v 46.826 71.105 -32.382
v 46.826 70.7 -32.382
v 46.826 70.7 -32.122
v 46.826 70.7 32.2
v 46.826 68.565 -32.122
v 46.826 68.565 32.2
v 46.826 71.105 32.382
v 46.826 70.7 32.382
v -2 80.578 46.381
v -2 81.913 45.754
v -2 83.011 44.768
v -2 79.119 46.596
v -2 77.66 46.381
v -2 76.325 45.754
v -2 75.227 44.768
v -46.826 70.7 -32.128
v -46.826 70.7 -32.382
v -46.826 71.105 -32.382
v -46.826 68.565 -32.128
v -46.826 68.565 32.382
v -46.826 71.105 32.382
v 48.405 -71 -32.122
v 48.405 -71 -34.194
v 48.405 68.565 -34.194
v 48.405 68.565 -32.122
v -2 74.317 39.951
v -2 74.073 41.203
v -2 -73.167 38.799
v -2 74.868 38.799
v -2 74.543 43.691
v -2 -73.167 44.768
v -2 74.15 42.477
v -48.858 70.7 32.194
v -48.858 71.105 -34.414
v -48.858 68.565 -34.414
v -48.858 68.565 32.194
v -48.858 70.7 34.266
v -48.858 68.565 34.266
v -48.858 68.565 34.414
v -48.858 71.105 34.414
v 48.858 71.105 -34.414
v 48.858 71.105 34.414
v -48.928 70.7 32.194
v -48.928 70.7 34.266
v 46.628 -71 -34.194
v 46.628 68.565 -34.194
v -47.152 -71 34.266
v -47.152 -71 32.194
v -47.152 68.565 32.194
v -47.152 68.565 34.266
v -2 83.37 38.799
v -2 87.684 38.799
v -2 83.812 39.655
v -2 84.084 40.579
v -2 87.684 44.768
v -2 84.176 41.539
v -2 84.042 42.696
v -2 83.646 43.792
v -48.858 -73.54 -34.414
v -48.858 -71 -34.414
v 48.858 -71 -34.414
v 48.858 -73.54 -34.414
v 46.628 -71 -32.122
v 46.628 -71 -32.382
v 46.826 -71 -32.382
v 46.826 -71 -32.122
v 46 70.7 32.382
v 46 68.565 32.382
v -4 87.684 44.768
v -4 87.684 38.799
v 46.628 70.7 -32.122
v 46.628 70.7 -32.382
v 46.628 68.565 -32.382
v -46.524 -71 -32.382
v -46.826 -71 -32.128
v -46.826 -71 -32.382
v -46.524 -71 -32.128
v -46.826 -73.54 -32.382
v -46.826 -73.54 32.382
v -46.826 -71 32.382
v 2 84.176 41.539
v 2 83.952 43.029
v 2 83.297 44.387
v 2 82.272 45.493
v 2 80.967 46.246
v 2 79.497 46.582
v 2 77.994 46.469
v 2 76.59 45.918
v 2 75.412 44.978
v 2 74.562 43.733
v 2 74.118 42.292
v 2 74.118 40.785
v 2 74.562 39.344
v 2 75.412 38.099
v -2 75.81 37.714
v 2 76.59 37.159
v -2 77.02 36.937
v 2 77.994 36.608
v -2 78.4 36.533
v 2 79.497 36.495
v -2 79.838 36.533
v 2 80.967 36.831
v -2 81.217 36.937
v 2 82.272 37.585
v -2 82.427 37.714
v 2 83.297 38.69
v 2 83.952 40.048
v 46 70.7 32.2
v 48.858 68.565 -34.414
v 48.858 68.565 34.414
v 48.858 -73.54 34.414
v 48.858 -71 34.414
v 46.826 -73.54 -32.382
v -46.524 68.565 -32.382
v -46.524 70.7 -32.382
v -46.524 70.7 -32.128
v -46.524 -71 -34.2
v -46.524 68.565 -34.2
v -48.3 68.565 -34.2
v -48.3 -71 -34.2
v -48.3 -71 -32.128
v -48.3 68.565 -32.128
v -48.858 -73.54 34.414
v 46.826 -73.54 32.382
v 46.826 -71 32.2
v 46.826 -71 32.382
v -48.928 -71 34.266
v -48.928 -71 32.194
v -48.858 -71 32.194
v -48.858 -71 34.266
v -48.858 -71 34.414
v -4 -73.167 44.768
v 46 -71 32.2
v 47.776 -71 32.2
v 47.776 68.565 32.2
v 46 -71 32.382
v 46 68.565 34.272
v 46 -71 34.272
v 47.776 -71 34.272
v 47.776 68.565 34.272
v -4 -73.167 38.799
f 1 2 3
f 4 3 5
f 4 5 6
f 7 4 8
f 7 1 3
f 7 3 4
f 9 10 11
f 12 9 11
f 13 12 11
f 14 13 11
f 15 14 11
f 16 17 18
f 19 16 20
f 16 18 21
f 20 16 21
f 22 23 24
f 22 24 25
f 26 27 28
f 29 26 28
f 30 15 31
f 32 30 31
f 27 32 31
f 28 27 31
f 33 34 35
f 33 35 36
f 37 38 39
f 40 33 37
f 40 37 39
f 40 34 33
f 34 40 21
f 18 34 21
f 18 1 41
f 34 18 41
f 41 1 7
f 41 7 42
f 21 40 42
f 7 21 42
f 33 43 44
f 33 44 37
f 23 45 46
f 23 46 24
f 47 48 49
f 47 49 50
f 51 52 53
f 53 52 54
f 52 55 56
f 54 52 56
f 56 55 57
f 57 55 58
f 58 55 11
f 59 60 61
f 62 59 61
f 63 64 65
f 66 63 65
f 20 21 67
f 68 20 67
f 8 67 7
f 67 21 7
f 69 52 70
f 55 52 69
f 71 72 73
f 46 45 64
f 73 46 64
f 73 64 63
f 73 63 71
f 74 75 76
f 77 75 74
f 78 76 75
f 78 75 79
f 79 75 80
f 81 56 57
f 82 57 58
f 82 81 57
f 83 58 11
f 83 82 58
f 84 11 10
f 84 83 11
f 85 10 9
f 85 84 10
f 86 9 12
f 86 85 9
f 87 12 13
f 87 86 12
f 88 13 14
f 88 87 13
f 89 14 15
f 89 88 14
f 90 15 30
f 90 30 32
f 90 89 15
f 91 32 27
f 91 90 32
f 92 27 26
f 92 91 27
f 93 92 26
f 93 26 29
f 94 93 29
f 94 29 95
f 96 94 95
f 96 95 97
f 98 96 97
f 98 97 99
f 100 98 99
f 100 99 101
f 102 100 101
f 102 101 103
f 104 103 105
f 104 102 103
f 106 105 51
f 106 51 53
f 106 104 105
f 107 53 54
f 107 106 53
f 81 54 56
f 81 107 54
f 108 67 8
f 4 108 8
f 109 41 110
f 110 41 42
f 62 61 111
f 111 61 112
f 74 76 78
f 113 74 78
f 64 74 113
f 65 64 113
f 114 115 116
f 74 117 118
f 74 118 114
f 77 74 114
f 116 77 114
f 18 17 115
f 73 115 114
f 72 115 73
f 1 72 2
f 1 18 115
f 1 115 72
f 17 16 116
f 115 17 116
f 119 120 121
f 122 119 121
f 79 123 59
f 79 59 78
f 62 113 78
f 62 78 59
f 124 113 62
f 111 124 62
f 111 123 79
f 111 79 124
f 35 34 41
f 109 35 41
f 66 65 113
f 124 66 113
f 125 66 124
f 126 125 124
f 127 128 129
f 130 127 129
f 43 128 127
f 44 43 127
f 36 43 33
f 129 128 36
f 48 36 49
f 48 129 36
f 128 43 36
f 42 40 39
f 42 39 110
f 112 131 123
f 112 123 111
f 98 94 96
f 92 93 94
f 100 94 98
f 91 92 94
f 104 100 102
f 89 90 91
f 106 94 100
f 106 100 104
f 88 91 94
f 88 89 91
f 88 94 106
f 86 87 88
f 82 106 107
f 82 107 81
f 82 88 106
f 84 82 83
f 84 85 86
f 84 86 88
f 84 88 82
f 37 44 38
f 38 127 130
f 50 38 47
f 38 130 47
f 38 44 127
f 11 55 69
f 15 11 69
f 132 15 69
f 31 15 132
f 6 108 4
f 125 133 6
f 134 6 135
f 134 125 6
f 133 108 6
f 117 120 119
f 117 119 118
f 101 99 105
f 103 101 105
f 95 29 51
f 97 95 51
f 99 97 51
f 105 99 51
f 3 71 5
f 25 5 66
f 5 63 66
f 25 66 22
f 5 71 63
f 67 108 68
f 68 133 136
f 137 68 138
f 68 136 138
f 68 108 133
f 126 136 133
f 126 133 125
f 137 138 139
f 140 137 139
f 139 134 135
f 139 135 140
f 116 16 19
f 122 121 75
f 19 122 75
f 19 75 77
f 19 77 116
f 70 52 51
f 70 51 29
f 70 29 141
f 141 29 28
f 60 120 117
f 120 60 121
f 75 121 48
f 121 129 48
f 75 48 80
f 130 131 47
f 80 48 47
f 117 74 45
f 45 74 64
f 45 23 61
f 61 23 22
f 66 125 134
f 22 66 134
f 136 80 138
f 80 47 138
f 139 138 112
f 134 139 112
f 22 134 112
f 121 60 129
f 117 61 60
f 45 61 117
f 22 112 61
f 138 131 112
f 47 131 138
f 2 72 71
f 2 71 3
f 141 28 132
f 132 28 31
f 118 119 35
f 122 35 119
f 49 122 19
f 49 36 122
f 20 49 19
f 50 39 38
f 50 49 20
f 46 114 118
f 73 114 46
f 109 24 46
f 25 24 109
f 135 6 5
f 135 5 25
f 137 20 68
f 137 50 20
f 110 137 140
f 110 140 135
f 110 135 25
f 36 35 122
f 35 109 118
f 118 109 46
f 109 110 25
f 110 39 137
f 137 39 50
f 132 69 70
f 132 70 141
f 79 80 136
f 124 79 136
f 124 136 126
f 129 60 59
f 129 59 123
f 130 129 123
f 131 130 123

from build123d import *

# Parameters (mm, degrees)
F0_W      = 97.7168083191
F0_H      = 68.8288807869
F0_W_2    = 93.6528071761
F0_H_2    = 64.7648796439
F1_DEPTH  = 2.54
F6_W      = 1.7763152719
F6_H      = 2.0723715425
F7_DEPTH  = 141.7
F8_DEPTH  = 141.7
F9_DEPTH  = 141.7
F10_DEPTH = 141.7
F11_R     = 5.0573026927
F12_DEPTH = 2
F13_W     = 160.8517989516
F13_H     = 5.9691108763
F14_DEPTH = 2


with BuildPart() as f1:
    # F0 (on Front) → F1 (new body)
    with BuildSketch(Plane.XZ):
        Rectangle(F0_W, F0_H)
        Rectangle(F0_W_2, F0_H_2, mode=Mode.SUBTRACT)
    extrude(amount=F1_DEPTH)


with BuildPart() as f3_1:
    # F3: copy of F1
    add(f1.part.moved(Location((0, 142.1052739024, 0))))


with BuildPart() as f1_1:
    # F4: moved
    add(f1.part.moved(Location((0, -71, 0))))



with BuildPart() as f3_1_1:
    # F4: moved
    add(f3_1.part.moved(Location((0, -71, 0))))


with BuildPart() as f1_2:
    add(f1_1.part)

    add(f3_1_1.part)  # F7 merges F3_1
    # F6 (on offset) → F7 (join)
    with BuildSketch(Plane.XZ.offset(71)):
        with Locations((47.5164502859, -33.1578962505)):
            Rectangle(F6_W, F6_H)
    extrude(amount=-F7_DEPTH)

    # F6 (on offset) → F8 (join)
    with BuildSketch(Plane.XZ.offset(71)):
        with Locations((46.8881576359, 33.2361857712)):
            Rectangle(F6_W, F6_H)
    extrude(amount=-F8_DEPTH)

    # F6 (on offset) → F9 (join)
    with BuildSketch(Plane.XZ.offset(71)):
        with Locations((-48.0401350141, 33.2302677929)):
            Rectangle(F6_W, F6_H)
    extrude(amount=-F9_DEPTH)

    # F6 (on offset) → F10 (join)
    with BuildSketch(Plane.XZ.offset(71)):
        with Locations((-47.4118423641, -33.1638142288)):
            Rectangle(F6_W, F6_H)
    extrude(amount=-F10_DEPTH)


with BuildPart() as f12:
    # F11 (on Right) → F12 (new body, symmetric)
    with BuildSketch(Plane.YZ):
        with Locations((79.1189521551, 41.5385514498)):
            Circle(F11_R)
    extrude(amount=F12_DEPTH, both=True)

    # F13 (on face) → F14 (join)
    with BuildSketch(Plane(origin=(-2, 0, 0), x_dir=(0, -1, 0), z_dir=(-1, 0, 0))):
        with Locations((-7.258515805, 41.783766821)):
            Rectangle(F13_W, F13_H)
    extrude(amount=F14_DEPTH)


solid = Compound([f1_2.part, f12.part])
